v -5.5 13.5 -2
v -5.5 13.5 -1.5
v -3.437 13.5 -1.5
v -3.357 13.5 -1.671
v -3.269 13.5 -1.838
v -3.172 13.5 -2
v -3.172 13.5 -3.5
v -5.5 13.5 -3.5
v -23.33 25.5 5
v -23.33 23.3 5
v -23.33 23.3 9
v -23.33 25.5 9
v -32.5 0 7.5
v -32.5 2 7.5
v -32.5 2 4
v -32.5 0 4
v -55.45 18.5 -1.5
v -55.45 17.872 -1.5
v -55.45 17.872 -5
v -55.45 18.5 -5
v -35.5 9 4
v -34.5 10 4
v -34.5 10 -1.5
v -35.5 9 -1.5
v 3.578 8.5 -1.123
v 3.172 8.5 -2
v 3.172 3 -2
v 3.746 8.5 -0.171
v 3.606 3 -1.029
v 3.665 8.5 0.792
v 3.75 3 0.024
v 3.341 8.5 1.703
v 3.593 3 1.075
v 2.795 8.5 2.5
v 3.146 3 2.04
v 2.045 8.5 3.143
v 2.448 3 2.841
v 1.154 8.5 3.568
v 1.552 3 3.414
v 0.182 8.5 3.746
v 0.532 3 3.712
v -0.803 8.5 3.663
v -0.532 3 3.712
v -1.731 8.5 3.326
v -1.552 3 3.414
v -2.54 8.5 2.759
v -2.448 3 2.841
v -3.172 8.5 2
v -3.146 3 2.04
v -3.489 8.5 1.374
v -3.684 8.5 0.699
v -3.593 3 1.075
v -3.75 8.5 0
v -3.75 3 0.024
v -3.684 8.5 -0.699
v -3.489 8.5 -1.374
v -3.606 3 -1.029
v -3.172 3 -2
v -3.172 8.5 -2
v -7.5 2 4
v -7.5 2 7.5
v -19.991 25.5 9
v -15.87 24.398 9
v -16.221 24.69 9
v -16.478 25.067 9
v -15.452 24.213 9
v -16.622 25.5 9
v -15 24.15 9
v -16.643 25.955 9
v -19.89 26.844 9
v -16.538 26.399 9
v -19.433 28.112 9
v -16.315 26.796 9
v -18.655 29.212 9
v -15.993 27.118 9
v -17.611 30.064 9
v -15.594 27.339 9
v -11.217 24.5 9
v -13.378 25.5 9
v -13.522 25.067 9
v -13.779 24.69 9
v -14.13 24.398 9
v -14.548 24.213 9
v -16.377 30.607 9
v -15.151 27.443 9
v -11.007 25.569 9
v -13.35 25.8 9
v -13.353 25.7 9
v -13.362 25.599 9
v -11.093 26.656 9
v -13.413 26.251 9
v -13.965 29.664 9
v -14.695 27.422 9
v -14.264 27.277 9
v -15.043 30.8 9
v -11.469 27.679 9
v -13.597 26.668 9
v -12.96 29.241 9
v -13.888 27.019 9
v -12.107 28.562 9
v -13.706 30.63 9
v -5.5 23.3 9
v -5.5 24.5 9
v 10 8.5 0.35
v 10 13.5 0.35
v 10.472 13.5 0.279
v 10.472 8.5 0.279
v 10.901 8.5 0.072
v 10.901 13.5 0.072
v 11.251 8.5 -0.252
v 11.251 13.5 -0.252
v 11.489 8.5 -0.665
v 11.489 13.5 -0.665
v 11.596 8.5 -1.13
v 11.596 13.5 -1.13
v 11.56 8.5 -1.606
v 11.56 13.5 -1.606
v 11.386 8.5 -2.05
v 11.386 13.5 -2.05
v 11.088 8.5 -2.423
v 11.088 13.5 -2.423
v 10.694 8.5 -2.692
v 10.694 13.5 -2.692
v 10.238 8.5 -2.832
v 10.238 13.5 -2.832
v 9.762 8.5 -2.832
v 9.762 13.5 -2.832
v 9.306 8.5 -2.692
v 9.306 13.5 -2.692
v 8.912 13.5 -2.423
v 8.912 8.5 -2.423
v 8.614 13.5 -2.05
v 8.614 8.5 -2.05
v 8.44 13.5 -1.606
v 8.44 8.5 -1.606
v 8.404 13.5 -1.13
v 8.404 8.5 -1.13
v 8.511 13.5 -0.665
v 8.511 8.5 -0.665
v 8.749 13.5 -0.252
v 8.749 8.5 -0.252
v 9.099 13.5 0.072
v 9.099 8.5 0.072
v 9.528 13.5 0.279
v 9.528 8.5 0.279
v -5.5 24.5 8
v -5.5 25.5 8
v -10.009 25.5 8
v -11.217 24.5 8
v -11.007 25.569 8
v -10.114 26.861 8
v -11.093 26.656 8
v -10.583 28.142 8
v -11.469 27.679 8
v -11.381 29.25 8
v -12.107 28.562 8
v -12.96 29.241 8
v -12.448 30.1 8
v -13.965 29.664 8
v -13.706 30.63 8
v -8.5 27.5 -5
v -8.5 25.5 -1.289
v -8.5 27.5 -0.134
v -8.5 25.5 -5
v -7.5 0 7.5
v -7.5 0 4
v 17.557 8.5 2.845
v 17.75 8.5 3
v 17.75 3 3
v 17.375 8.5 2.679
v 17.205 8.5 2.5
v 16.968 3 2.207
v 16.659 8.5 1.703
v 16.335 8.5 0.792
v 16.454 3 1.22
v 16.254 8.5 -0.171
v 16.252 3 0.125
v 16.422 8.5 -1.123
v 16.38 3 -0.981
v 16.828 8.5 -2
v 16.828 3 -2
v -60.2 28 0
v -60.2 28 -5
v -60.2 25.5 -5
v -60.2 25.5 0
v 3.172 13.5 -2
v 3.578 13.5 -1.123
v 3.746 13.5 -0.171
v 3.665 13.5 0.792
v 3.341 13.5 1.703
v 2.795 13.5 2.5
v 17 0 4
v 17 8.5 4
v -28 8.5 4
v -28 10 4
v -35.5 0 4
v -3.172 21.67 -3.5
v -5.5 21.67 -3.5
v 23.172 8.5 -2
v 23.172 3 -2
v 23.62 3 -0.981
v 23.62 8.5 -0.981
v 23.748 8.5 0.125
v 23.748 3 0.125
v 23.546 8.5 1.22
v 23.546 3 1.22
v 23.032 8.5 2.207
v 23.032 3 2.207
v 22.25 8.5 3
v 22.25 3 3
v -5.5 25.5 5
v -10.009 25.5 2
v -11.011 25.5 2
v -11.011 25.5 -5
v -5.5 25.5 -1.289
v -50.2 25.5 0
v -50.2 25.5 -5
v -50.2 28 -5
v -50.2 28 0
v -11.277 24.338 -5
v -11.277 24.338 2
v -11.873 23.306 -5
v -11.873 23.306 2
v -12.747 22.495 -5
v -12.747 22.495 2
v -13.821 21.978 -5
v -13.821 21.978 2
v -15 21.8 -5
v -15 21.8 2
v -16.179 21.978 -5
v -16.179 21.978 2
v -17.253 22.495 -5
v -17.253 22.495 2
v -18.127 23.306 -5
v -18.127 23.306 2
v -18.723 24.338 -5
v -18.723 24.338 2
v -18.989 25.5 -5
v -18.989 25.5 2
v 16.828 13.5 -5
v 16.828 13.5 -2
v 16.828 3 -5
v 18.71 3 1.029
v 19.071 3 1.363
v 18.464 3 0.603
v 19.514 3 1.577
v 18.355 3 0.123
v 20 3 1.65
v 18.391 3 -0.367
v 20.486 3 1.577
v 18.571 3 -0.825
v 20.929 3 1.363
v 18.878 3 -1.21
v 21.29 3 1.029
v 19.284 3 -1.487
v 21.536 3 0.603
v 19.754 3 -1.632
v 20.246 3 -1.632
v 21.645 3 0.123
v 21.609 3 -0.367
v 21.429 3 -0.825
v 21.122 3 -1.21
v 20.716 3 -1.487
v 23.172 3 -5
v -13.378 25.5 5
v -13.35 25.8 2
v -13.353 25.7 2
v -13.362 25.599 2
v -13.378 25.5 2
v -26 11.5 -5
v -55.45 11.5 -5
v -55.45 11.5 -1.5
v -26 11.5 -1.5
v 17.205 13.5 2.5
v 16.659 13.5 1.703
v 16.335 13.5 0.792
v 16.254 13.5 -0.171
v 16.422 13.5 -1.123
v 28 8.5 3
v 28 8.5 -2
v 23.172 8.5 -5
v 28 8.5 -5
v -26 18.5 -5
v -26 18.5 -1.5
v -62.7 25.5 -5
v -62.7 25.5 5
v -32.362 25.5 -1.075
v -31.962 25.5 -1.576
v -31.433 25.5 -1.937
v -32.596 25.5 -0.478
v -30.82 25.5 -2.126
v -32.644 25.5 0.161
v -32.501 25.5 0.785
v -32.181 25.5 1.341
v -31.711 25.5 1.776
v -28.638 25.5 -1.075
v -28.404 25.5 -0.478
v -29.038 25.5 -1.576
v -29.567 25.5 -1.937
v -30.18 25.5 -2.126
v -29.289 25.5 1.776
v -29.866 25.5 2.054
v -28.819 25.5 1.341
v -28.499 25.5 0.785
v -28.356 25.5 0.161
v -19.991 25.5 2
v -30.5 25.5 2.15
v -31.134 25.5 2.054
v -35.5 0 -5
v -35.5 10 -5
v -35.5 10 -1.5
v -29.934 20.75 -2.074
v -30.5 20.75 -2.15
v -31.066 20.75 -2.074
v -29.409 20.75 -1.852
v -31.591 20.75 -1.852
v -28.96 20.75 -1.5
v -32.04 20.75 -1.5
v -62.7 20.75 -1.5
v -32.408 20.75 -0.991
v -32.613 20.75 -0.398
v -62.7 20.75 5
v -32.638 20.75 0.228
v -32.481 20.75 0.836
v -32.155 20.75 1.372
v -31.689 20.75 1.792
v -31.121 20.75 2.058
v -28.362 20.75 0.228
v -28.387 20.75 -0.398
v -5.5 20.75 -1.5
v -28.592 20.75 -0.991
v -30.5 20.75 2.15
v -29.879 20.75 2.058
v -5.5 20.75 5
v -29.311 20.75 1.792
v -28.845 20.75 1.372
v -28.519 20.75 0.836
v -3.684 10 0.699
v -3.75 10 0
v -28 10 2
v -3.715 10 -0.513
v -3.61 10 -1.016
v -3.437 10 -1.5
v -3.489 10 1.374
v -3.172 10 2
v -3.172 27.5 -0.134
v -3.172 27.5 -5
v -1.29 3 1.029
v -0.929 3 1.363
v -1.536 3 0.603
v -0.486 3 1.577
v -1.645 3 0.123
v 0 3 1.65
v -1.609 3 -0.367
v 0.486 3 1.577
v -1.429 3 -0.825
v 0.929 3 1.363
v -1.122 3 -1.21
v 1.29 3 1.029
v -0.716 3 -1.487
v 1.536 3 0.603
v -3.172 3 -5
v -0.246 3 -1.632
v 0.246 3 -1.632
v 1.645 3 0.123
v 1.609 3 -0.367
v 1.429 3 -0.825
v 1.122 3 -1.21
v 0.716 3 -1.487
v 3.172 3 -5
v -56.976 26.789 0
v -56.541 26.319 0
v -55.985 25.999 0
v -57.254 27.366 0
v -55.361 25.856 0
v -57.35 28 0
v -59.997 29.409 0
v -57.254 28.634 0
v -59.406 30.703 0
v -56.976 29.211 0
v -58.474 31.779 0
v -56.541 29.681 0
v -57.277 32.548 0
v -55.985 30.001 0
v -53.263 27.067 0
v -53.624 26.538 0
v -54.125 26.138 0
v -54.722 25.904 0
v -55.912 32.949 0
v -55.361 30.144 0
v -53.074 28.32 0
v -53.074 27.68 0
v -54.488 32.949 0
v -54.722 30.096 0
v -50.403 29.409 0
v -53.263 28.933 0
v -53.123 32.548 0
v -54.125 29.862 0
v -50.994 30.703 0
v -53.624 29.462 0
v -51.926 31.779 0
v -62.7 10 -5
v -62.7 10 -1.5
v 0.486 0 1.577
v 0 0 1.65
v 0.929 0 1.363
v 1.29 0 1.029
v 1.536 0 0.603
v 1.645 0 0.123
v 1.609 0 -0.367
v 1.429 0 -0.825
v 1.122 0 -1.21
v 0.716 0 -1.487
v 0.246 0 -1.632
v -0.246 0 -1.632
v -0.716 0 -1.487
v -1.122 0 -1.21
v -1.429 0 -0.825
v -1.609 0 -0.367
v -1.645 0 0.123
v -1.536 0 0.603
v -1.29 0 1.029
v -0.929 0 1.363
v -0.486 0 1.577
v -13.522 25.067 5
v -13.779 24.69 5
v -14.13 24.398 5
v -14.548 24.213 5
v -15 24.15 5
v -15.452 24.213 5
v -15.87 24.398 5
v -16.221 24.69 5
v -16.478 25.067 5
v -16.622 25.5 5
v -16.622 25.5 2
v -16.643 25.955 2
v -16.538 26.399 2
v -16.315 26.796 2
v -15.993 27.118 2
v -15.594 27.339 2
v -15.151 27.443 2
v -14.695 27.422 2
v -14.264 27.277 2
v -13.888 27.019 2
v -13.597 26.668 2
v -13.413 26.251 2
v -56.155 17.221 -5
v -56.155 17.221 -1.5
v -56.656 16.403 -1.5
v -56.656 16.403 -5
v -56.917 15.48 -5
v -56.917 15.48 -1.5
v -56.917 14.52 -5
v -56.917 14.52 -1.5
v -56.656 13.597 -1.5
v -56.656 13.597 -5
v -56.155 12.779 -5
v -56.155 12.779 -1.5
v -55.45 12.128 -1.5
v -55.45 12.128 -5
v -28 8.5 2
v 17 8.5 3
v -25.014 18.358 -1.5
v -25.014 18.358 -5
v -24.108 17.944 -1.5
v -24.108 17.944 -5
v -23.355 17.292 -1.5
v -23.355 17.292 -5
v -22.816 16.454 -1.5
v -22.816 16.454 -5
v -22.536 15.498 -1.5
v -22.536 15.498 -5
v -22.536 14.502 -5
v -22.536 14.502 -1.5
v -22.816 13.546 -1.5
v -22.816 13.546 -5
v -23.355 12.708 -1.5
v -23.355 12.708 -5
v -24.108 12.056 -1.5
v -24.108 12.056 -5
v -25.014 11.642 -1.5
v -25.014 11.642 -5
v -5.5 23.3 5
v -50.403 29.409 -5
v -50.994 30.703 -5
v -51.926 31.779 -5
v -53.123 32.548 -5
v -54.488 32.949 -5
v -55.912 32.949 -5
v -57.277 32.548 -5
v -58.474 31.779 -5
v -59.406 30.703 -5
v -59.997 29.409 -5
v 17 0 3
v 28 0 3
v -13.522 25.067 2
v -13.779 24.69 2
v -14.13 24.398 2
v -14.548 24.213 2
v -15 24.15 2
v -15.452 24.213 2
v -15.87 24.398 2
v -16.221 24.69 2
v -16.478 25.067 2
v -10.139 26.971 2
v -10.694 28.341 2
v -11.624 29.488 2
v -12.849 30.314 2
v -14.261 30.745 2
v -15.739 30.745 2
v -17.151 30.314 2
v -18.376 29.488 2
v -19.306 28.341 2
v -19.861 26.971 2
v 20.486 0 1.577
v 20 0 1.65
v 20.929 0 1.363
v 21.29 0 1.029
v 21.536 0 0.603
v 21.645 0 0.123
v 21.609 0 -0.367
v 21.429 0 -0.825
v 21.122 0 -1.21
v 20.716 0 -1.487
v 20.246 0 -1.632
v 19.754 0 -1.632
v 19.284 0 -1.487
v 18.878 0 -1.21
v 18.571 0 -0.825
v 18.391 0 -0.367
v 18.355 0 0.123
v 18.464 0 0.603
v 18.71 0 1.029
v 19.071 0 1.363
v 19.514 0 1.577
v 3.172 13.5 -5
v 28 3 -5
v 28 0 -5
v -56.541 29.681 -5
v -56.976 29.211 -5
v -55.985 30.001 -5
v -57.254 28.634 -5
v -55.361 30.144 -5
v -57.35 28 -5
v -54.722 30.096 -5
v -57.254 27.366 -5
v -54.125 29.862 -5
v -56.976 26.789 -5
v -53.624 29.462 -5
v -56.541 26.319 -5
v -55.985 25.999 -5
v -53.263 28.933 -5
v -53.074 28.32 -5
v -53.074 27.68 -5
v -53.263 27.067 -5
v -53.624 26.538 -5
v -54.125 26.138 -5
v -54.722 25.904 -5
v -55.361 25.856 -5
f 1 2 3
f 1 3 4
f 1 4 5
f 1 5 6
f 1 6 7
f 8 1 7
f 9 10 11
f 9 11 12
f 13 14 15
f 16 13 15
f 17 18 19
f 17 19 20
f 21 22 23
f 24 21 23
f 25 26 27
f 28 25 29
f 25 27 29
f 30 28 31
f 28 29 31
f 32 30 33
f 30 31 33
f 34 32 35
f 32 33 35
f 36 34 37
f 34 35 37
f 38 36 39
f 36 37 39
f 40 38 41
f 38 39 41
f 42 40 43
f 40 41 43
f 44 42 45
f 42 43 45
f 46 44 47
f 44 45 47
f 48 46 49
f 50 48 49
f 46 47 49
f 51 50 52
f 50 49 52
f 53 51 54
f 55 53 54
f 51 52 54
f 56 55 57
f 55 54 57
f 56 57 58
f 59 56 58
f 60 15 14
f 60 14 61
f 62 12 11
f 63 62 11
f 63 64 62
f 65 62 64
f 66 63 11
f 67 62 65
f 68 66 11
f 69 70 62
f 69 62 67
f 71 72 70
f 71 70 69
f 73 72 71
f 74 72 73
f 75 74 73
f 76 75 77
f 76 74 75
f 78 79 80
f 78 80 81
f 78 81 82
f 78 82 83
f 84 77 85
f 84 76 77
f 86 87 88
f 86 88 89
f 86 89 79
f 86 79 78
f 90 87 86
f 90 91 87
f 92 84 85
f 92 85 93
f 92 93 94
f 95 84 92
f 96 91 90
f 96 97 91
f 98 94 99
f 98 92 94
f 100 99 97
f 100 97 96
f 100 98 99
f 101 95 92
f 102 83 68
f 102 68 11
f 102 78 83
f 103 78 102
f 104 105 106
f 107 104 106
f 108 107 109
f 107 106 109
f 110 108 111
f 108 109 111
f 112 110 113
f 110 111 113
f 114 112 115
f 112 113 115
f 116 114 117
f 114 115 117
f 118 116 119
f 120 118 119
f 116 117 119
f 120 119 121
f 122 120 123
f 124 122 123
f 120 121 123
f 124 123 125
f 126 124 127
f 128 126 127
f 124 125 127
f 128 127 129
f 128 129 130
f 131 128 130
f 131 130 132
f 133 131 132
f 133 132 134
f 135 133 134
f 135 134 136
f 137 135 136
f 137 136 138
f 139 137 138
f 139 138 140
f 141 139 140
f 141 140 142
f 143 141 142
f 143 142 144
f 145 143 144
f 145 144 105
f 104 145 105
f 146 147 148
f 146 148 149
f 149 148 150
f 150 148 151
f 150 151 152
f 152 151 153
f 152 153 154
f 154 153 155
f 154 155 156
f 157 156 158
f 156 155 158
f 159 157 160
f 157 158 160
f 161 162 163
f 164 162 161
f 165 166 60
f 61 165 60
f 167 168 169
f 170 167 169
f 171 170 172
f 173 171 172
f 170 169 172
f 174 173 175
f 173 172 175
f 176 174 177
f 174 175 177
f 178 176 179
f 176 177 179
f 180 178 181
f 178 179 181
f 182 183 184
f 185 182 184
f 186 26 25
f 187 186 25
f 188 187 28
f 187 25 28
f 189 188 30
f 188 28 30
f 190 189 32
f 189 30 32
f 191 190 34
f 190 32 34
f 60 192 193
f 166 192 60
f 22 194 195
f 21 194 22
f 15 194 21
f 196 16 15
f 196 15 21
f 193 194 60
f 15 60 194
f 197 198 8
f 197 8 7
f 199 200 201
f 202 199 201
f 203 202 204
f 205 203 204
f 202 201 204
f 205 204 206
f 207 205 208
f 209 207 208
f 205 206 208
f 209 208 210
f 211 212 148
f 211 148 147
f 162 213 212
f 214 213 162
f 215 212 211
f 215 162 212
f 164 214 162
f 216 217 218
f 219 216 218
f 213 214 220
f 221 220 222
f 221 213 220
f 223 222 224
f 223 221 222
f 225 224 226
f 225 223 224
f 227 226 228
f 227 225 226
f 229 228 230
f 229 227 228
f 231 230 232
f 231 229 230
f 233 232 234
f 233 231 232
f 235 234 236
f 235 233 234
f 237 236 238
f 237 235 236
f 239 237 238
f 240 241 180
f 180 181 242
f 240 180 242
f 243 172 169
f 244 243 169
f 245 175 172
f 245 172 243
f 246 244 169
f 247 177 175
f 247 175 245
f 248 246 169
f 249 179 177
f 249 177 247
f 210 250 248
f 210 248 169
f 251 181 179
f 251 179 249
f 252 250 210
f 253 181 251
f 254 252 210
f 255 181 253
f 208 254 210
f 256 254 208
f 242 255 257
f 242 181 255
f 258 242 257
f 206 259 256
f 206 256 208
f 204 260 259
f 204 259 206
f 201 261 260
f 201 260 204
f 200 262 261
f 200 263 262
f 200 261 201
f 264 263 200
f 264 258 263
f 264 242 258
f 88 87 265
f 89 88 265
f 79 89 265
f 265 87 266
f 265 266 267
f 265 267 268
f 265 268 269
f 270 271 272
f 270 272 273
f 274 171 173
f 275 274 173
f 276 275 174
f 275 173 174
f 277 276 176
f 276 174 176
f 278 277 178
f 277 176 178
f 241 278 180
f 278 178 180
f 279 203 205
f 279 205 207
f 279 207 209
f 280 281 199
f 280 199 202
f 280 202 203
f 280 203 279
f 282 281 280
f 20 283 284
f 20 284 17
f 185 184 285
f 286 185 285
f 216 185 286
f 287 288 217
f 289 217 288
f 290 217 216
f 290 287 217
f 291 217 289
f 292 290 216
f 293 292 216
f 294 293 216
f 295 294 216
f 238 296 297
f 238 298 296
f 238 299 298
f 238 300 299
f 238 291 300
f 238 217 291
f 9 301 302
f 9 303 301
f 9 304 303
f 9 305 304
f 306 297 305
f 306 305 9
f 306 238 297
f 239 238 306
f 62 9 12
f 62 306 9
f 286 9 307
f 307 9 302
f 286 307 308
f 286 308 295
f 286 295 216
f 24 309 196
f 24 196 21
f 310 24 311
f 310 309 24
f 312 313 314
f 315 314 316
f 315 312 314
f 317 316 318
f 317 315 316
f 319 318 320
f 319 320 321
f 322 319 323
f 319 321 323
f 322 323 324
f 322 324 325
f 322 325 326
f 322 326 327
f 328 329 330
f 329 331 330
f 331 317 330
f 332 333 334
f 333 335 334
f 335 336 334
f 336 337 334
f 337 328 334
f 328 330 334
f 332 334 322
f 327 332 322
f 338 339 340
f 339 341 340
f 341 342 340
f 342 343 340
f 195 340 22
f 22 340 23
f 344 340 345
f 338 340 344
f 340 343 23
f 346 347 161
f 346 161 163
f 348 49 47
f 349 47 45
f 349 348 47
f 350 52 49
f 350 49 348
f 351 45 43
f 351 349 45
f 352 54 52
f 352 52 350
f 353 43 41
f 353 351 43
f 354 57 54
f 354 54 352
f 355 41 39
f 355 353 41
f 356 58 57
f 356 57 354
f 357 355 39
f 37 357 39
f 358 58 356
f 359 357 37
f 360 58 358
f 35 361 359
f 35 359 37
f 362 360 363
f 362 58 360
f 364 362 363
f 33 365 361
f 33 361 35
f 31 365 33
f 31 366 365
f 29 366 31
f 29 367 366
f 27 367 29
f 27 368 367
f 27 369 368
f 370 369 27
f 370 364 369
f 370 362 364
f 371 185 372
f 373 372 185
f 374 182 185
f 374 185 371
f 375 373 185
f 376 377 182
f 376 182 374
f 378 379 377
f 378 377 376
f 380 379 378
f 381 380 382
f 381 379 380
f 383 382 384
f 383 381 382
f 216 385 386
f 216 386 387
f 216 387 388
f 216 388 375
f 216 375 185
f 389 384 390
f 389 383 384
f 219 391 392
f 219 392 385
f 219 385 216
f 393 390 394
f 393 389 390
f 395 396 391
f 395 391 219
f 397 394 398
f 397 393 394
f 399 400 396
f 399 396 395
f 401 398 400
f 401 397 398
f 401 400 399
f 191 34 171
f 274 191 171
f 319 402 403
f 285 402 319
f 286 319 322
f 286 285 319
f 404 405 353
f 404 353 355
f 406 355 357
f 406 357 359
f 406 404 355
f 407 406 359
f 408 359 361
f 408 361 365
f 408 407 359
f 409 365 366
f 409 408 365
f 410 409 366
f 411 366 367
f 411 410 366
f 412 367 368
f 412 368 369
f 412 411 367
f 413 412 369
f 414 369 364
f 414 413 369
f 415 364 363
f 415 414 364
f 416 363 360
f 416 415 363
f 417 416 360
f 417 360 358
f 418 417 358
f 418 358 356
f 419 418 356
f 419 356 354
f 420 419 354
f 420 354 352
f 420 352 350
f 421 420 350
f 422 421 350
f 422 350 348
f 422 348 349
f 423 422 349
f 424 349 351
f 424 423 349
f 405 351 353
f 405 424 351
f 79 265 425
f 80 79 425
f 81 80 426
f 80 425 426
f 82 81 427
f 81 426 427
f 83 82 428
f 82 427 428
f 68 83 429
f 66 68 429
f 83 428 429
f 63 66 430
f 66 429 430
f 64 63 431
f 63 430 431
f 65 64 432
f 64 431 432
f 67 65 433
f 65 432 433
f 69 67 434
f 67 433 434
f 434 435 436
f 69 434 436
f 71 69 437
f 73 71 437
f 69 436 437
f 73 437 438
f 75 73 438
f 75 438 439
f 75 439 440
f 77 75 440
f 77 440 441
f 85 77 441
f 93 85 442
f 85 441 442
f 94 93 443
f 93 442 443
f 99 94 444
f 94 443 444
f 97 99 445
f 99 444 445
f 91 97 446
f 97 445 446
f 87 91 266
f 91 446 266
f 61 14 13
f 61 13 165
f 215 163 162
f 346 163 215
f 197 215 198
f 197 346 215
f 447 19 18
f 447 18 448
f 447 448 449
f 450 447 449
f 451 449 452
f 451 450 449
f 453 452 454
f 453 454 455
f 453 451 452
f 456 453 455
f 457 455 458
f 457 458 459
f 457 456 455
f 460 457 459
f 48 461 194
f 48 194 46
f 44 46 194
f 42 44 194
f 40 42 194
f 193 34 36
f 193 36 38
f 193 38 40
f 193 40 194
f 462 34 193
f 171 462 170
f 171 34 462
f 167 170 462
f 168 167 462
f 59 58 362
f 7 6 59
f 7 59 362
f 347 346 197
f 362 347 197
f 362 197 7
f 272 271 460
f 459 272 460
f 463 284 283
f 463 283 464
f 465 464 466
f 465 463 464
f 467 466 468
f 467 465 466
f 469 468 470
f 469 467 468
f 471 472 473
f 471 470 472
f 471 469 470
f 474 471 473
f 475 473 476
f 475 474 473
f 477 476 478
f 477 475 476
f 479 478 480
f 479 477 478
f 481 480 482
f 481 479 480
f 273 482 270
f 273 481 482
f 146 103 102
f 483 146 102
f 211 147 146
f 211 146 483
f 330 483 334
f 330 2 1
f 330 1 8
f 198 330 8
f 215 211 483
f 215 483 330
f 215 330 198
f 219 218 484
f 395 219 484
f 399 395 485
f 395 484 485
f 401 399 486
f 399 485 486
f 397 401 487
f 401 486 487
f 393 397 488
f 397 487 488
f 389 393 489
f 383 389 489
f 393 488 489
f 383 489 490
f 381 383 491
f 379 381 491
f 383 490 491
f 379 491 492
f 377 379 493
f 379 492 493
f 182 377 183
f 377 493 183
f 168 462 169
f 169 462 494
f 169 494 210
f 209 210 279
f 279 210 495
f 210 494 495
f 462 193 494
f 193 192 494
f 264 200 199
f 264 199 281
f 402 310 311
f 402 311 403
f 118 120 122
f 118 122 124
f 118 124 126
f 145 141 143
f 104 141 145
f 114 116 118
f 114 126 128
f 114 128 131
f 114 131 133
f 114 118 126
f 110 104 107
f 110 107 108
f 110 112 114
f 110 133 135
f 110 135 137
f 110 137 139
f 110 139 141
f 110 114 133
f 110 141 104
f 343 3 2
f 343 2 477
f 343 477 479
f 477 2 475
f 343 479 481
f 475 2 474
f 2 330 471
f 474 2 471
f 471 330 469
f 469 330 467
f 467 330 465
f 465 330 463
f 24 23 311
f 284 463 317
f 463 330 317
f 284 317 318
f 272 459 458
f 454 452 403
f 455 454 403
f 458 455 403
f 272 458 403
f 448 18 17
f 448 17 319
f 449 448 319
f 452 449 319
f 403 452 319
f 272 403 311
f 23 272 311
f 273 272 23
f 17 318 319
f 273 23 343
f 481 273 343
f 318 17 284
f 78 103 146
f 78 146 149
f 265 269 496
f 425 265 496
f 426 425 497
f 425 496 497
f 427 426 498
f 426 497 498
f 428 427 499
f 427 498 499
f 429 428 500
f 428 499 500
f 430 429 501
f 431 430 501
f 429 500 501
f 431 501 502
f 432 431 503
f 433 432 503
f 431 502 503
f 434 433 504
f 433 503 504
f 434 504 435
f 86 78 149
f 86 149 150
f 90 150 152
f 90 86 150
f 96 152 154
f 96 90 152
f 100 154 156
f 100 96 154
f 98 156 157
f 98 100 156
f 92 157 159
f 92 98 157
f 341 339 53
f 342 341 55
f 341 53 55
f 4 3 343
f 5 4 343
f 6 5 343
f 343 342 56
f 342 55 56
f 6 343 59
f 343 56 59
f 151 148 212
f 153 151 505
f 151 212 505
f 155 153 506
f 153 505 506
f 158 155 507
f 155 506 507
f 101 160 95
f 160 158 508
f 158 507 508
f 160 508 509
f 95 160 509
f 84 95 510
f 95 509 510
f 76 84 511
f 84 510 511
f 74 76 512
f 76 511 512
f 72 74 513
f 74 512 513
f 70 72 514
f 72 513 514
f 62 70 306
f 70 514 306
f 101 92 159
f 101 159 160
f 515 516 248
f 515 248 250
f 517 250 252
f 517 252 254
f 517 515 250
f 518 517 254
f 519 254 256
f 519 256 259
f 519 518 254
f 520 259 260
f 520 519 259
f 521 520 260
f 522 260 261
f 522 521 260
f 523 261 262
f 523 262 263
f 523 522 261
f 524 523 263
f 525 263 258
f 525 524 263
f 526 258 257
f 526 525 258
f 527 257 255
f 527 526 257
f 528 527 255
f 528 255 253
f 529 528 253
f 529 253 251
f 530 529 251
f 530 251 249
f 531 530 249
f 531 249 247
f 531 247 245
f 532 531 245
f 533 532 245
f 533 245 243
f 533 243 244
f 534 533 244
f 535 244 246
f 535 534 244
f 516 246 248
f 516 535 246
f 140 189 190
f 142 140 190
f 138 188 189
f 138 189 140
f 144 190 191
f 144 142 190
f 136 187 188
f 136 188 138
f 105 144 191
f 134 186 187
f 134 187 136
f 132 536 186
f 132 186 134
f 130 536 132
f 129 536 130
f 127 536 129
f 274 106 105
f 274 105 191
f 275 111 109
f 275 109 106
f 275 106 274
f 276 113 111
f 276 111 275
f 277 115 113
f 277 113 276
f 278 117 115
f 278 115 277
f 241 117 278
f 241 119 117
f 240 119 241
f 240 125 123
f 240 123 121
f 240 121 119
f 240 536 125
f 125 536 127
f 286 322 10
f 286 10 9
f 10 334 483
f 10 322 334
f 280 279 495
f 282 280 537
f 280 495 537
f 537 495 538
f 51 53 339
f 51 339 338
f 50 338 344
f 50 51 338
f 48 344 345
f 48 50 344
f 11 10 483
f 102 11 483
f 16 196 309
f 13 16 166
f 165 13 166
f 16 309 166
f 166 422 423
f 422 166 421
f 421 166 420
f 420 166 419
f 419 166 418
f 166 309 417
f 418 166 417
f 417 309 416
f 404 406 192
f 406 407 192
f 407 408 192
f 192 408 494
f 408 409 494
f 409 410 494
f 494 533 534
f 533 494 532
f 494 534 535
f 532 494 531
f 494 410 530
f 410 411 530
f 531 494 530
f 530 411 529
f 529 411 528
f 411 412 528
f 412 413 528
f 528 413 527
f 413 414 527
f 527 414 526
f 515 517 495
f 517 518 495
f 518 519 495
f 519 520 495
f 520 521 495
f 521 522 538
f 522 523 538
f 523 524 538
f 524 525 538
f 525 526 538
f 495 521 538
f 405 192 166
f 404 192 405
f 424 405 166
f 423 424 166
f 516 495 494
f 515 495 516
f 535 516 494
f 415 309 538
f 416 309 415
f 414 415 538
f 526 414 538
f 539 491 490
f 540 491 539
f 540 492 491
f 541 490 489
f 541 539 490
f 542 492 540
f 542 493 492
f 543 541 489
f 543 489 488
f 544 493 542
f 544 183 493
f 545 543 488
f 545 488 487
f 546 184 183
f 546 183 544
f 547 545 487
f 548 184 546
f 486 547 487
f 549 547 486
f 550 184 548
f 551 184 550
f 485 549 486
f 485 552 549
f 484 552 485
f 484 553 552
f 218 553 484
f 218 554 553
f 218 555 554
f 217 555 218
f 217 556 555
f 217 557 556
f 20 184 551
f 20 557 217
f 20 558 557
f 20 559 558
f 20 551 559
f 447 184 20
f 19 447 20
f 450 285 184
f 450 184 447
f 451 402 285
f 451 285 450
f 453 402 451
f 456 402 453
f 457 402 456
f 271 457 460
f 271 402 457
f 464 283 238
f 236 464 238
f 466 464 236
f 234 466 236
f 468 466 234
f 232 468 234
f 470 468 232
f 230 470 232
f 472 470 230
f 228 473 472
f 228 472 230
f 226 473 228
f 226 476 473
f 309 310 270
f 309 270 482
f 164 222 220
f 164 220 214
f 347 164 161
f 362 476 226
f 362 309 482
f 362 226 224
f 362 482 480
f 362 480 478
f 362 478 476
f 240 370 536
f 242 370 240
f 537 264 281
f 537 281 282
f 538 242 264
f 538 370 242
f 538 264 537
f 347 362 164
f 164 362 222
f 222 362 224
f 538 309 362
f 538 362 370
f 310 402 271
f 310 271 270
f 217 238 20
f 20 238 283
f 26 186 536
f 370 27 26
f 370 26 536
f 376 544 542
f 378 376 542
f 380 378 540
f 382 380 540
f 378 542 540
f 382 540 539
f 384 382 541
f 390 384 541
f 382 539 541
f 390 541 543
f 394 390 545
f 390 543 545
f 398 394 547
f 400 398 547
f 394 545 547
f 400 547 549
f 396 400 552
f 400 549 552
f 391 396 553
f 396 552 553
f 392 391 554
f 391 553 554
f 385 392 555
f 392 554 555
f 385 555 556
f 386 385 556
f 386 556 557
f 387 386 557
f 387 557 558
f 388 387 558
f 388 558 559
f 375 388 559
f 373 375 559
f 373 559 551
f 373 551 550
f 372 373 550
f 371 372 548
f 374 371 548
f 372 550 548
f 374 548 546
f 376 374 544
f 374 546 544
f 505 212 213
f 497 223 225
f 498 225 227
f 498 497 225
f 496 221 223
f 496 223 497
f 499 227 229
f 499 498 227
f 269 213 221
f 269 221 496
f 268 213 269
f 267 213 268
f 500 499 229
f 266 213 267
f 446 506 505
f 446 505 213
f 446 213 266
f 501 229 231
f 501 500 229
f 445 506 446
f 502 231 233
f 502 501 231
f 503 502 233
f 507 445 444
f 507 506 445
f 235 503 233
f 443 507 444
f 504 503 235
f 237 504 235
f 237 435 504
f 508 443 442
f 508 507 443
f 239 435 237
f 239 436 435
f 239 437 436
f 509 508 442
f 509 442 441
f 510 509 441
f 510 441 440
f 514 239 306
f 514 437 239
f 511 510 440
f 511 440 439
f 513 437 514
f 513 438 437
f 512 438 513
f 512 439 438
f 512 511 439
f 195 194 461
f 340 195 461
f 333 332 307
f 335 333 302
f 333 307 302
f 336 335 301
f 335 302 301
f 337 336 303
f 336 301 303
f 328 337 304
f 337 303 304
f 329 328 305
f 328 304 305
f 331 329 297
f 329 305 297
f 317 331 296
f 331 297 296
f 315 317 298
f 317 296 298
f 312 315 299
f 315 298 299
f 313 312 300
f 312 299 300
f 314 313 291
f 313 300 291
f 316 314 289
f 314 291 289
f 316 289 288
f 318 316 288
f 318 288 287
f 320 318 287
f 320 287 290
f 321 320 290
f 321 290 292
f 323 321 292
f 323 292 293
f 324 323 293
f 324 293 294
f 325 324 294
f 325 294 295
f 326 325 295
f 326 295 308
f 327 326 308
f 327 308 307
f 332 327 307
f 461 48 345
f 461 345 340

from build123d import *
from build123d.topology import SkipClean

# Parameters (mm, degrees)
SKETCH_1_W                   = 63.5
SKETCH_1_H                   = 8
SKETCH_1_R                   = 1.65
EXTRUDE_1_DEPTH              = 3
SKETCH_4_W                   = 52.5
SKETCH_4_H                   = 1
EXTRUDE_3_DEPTH              = 3
EXTRUDE_4_DEPTH              = 5.5
EXTRUDE_5_DEPTH              = 1.5
EXTRUDE_5_DIRECTION_2_REACH  = 38.844
CHAMFER_1_SIZE               = 1
SKETCH_8_W                   = 22
SKETCH_8_H                   = 3.5
EXTRUDE_6_DEPTH              = 12.5
EXTRUDE_7_DEPTH              = 5
SKETCH_11_W                  = 10
SKETCH_11_H                  = 2
CUT_EXTRUDE_1_DEPTH          = 5
CUT_EXTRUDE_3_DEPTH          = 43.388087949
EXTRUDE_8_DEPTH              = 3.5
SKETCH_16_W                  = 3.5
SKETCH_16_H                  = 4
EXTRUDE_9_DEPTH              = 8
SKETCH_2_W                   = 10
SKETCH_2_H                   = 2
EXTRUDE_2_DEPTH              = 3
SKETCH_17_W                  = 30
SKETCH_17_H                  = 4.75
EXTRUDE_10_DEPTH             = 10
EXTRUDE_11_DEPTH             = 17
EXTRUDE_12_REACH             = 44.326
SKETCH_19_W                  = 2.327855615
SKETCH_19_H                  = 3
SKETCH_19_W_2                = 13.65571123
SKETCH_19_W_3                = 4.827855615
SKETCH_21_R                  = 1.65
CUT_EXTRUDE_4_DEPTH          = 45.838599443
EXTRUDE_13_DEPTH             = 4
EXTRUDE_13_DEPTH_BACK        = 3
SKETCH_23_R                  = 4
CUT_EXTRUDE_5_DEPTH          = 48.517260022
SKETCH_24_W                  = 5.169872981
SKETCH_24_H                  = 2.2
SKETCH_24_W_2                = 4
EXTRUDE_14_DEPTH             = 4
CUT_EXTRUDE_6_DEPTH          = 1
SKETCH_26_R                  = 2.15
CUT_EXTRUDE_7_DEPTH          = 4.75
EXTRUDE_15_DEPTH             = 3.5
SKETCH_28_W                  = 6.5
SKETCH_28_H                  = 4.75
EXTRUDE_16_DEPTH             = 27.2
SKETCH_29_R                  = 2.15
EXTRUDE_17_DEPTH             = 5
SKETCH_30_R                  = 1.6
CUT_EXTRUDE_8_DEPTH          = 5
SKETCH_31_W                  = 28
SKETCH_31_H                  = 2
EXTRUDE_18_DEPTH             = 3.5
CUT_EXTRUDE_9_DEPTH          = 2.5
EXTRUDE_19_DEPTH             = 1.5
SKETCH_34_W                  = 4
SKETCH_34_H                  = 12
CUT_EXTRUDE_10_DEPTH         = 67.647130471
SKETCH_35_W                  = 4.827855615
SKETCH_35_H                  = 3
CUT_EXTRUDE_11_DEPTH         = 5
SKETCH_36_W                  = 2.327855615
SKETCH_36_H                  = 1.5
EXTRUDE_20_DEPTH             = 14
SKETCH_37_W                  = 3
SKETCH_37_H                  = 1.5
EXTRUDE_21_DEPTH             = 2
SKETCH_38_W                  = 3
SKETCH_38_H                  = 3.5
CUT_EXTRUDE_12_DEPTH         = 10
SKETCH_39_W                  = 2
SKETCH_39_H                  = 7
CUT_EXTRUDE_13_DEPTH         = 3.5
EXTRUDE_22_REACH             = 68.647
EXTRUDE_22_DIRECTION_2_REACH = 68.647


with BuildPart() as part:
    # 草图1 → 凸台-拉伸1 (new body)
    with BuildSketch(Plane(origin=(0, 0, 0), x_dir=(1, 0, 0), z_dir=(0, 1, 0))):
        with Locations((-3.75, 1)):
            Rectangle(SKETCH_1_W, SKETCH_1_H)
        with Locations(Location((0, 0, 0), (0, 0, 270))):
            Circle(SKETCH_1_R, mode=Mode.SUBTRACT)
        with Locations(Location((20, 0, 0), (0, 0, 270))):
            Circle(SKETCH_1_R, mode=Mode.SUBTRACT)
    extrude(amount=EXTRUDE_1_DEPTH)

    # 草图4 → 凸台-拉伸3 (add)
    with BuildSketch(Plane(origin=(0, 3, 0), x_dir=(1, 0, 0), z_dir=(0, 1, 0))):
        with Locations((-9.25, -3.5)):
            Rectangle(SKETCH_4_W, SKETCH_4_H)
    extrude(amount=-EXTRUDE_3_DEPTH)

    # 草图6 → 凸台-拉伸4 (add)
    with BuildSketch(Plane(origin=(0, 3, 0), x_dir=(1, 0, 0), z_dir=(0, 1, 0))):
        with BuildLine():
            Line((-35.5, -4), (17, -4))
            Line((17, -4), (17, -3))
            Line((17, -3), (17.75, -3))
            ThreePointArc((17.75, -3), (16.31219409, -0.680137903), (16.827855615, 2))
            Line((16.827855615, 2), (3.172144385, 2))
            ThreePointArc((3.172144385, 2), (0, -3.75), (-3.172144385, 2))
            Line((-3.172144385, 2), (-35.5, 2))
            Line((-35.5, 2), (-35.5, -4))
        make_face()
        with BuildLine():
            Line((28, -3), (28, 2))
            Line((28, 2), (23.172144385, 2))
            ThreePointArc((23.172144385, 2), (23.68780591, -0.680137903), (22.25, -3))
            Line((22.25, -3), (28, -3))
        make_face()
    extrude(amount=EXTRUDE_4_DEPTH)

    # 草图7 → 凸台-拉伸5 (add)
    with BuildSketch(Plane(origin=(0, 8.5, 0), x_dir=(1, 0, 0), z_dir=(0, 1, 0))):
        Polygon((-18, -4), (-35.5, -4), (-35.5, 5), (-5.5, 5), (-5.5, 0), (-18, 0), align=None)
    extrude(amount=EXTRUDE_5_DEPTH)

    # 草图7 → 凸台-拉伸5 direction 2 (add, up to next)
    with BuildSketch(Plane(origin=(0, 8.5, 0), x_dir=(1, 0, 0), z_dir=(0, 1, 0)), mode=Mode.PRIVATE) as extrude_5_direction_2_sk1:
        Polygon((-18, -4), (-35.5, -4), (-35.5, 5), (-5.5, 5), (-5.5, 0), (-18, 0), align=None)
    extrude_5_direction_2_tool1 = extrude(extrude_5_direction_2_sk1.sketch, amount=-EXTRUDE_5_DIRECTION_2_REACH, mode=Mode.PRIVATE) - part.part
    add(extrude_5_direction_2_tool1.solids().sort_by_distance((-22.488636, 8.5, -1.068182))[0])

    # 倒角1
    chamfer_1_edges = [part.edges().sort_by_distance(p)[0] for p in [
        (-35.5, 10, -0.5),
    ]]
    chamfer(chamfer_1_edges, length=CHAMFER_1_SIZE)

    # 草图8 → 凸台-拉伸6 (add)
    with BuildSketch(Plane(origin=(0, 10, 0), x_dir=(1, 0, 0), z_dir=(0, 1, 0))):
        with Locations((-16.5, 3.25)):
            Rectangle(SKETCH_8_W, SKETCH_8_H)
    extrude(amount=EXTRUDE_6_DEPTH)

    # 草图10 → 凸台-拉伸7 (add)
    with BuildSketch(Plane(origin=(0, 8.5, 0), x_dir=(1, 0, 0), z_dir=(0, 1, 0))):
        with BuildLine():
            Line((2.795084972, -2.5), (17.204915028, -2.5))
            ThreePointArc((17.204915028, -2.5), (16.263095325, -0.313118908), (16.827855615, 2))
            Line((16.827855615, 2), (3.172144385, 2))
            ThreePointArc((3.172144385, 2), (3.736904675, -0.313118908), (2.795084972, -2.5))
        make_face()
    extrude(amount=EXTRUDE_7_DEPTH)

    # 草图11 → 切除-拉伸1 (cut)
    with BuildSketch(Plane(origin=(0, 8.5, 0), x_dir=(1, 0, 0), z_dir=(0, 1, 0))):
        with Locations((-23, -3)):
            Rectangle(SKETCH_11_W, SKETCH_11_H)
    extrude(amount=CUT_EXTRUDE_1_DEPTH, mode=Mode.SUBTRACT)

    # 草图14 → 切除-拉伸3 (cut, through all)
    with BuildSketch(Plane.XY.offset(-1.5)):
        with BuildLine():
            Line((-27.5, 18.5), (-26, 18.5))
            ThreePointArc((-26, 18.5), (-22.5, 15), (-26, 11.5))
            Line((-26, 11.5), (-27.5, 11.5))
            ThreePointArc((-27.5, 11.5), (-31, 15), (-27.5, 18.5))
        make_face()
    extrude(amount=-CUT_EXTRUDE_3_DEPTH, mode=Mode.SUBTRACT)

    # 草图15 → 凸台-拉伸8 (add)
    with BuildSketch(Plane.XY.offset(-1.5)):
        Polygon((-27.5, 10), (-34.5, 10), (-35.5, 9), (-35.5, 11.5), (-27.5, 11.5), align=None)
    extrude(amount=-EXTRUDE_8_DEPTH)

    # 草图16 → 凸台-拉伸9 (add)
    with BuildSketch(Plane.ZY.offset(27.5)):
        with Locations((-3.25, 20.5)):
            Rectangle(SKETCH_16_W, SKETCH_16_H)
    extrude(amount=EXTRUDE_9_DEPTH)

    # 草图2 → 凸台-拉伸2 (add)
    with BuildSketch(Plane(origin=(0, 3, 0), x_dir=(1, 0, 0), z_dir=(0, 1, 0))):
        with Locations((10, -2)):
            Rectangle(SKETCH_2_W, SKETCH_2_H)
    extrude(amount=EXTRUDE_2_DEPTH)

    # 草图17 → 凸台-拉伸10 (add)
    with BuildSketch(Plane(origin=(0, 0, -5), x_dir=(-1, 0, 0), z_dir=(0, 0, -1))):
        with Locations((20.5, 23.125)):
            Rectangle(SKETCH_17_W, SKETCH_17_H)
    extrude(amount=-EXTRUDE_10_DEPTH)

    # 草图18 → 凸台-拉伸11 (add)
    with BuildSketch(Plane(origin=(0, 8.5, 0), x_dir=(1, 0, 0), z_dir=(0, 1, 0))):
        with BuildLine():
            Line((-5.5, 2), (-5.5, -2))
            Line((-5.5, -2), (-3.172144385, -2))
            ThreePointArc((-3.172144385, -2), (-3.75, 0), (-3.172144385, 2))
            Line((-3.172144385, 2), (-5.5, 2))
        make_face()
    extrude(amount=EXTRUDE_11_DEPTH)

    # 凸台-拉伸12: up to this face of the body (flat: up to its plane)
    extrude_12_end = Plane(part.part.faces().sort_by_distance((10, 13.5, 0.269728819))[0])
    # 草图19 → 凸台-拉伸12 (add, up to the picked face)
    with BuildSketch(Plane(origin=(0, 3, 0), x_dir=(1, 0, 0), z_dir=(0, 1, 0)), mode=Mode.PRIVATE) as extrude_12_sk1:
        with Locations((-4.336072192, 3.5)):
            Rectangle(SKETCH_19_W, SKETCH_19_H)
    extrude_12_tool1 = split(extrude(extrude_12_sk1.sketch, amount=EXTRUDE_12_REACH, mode=Mode.PRIVATE), bisect_by=extrude_12_end, keep=Keep.BOTH, mode=Mode.PRIVATE)
    # 草图19 → 凸台-拉伸12 (add, up to the picked face)
    with BuildSketch(Plane(origin=(0, 3, 0), x_dir=(1, 0, 0), z_dir=(0, 1, 0)), mode=Mode.PRIVATE) as extrude_12_sk2:
        with Locations((10, 3.5)):
            Rectangle(SKETCH_19_W_2, SKETCH_19_H)
    extrude_12_tool2 = split(extrude(extrude_12_sk2.sketch, amount=EXTRUDE_12_REACH, mode=Mode.PRIVATE), bisect_by=extrude_12_end, keep=Keep.BOTH, mode=Mode.PRIVATE)
    # 草图19 → 凸台-拉伸12 (add, up to the picked face)
    with BuildSketch(Plane(origin=(0, 3, 0), x_dir=(1, 0, 0), z_dir=(0, 1, 0)), mode=Mode.PRIVATE) as extrude_12_sk3:
        with Locations((25.586072193, 3.5)):
            Rectangle(SKETCH_19_W_3, SKETCH_19_H)
    extrude_12_tool3 = split(extrude(extrude_12_sk3.sketch, amount=EXTRUDE_12_REACH, mode=Mode.PRIVATE), bisect_by=extrude_12_end, keep=Keep.BOTH, mode=Mode.PRIVATE)
    add(extrude_12_tool1.solids().sort_by(Axis((-4.336072, 3, -3.5), (0, 1, 0)))[0])
    add(extrude_12_tool2.solids().sort_by(Axis((10, 3, -3.5), (0, 1, 0)))[0])
    add(extrude_12_tool3.solids().sort_by(Axis((25.586072, 3, -3.5), (0, 1, 0)))[0])

    # 草图21 → 切除-拉伸4 (cut, through all)
    with BuildSketch(Plane(origin=(0, 0, -5), x_dir=(-1, 0, 0), z_dir=(0, 0, -1))):
        with Locations((15, 25.8)):
            Circle(SKETCH_21_R)
    extrude(amount=-CUT_EXTRUDE_4_DEPTH, mode=Mode.SUBTRACT)

    # 草图22 → 凸台-拉伸13 (add, two sides: drawn at the far end of the back side and taken through both)
    with BuildSketch(Plane.XY.offset(5).offset(-EXTRUDE_13_DEPTH_BACK)):
        with BuildLine():
            ThreePointArc((-19.990991885, 25.5), (-19.788612994, 24.361533597), (-19.330127019, 23.3))
            Line((-19.330127019, 23.3), (-10.669872981, 23.3))
            ThreePointArc((-10.669872981, 23.3), (-10.211387006, 24.361533597), (-10.009008115, 25.5))
            Line((-10.009008115, 25.5), (-13.377501926, 25.5))
            ThreePointArc((-13.377501926, 25.5), (-15, 24.15), (-16.622498074, 25.5))
            Line((-16.622498074, 25.5), (-19.990991885, 25.5))
        make_face()
        with BuildLine():
            ThreePointArc((-10.009008115, 25.5), (-15, 30.8), (-19.990991885, 25.5))
            Line((-19.990991885, 25.5), (-16.622498074, 25.5))
            ThreePointArc((-16.622498074, 25.5), (-15.150628978, 27.443110134), (-13.35, 25.8))
            ThreePointArc((-13.35, 25.8), (-13.356889866, 25.649371022), (-13.377501926, 25.5))
            Line((-13.377501926, 25.5), (-10.009008115, 25.5))
        make_face()
    extrude(amount=EXTRUDE_13_DEPTH + EXTRUDE_13_DEPTH_BACK)

    # 草图23 → 切除-拉伸5 (cut, through all)
    with BuildSketch(Plane(origin=(0, 0, 2), x_dir=(-1, 0, 0), z_dir=(0, 0, -1))):
        with Locations((15, 25.8)):
            Circle(SKETCH_23_R)
    extrude(amount=CUT_EXTRUDE_5_DEPTH, mode=Mode.SUBTRACT)

    # 草图24 → 凸台-拉伸14 (add)
    with BuildSketch(Plane.XY.offset(5)):
        with Locations((-8.084936491, 24.4)):
            Rectangle(SKETCH_24_W, SKETCH_24_H)
        with Locations((-21.330127019, 24.4)):
            Rectangle(SKETCH_24_W_2, SKETCH_24_H)
    extrude(amount=EXTRUDE_14_DEPTH)

    # 草图25 → 切除-拉伸6 (cut)
    with BuildSketch(Plane.XY.offset(9)):
        with BuildLine():
            Line((-13.96472382, 29.663703305), (-13.705904774, 30.629629131))
            ThreePointArc((-13.705904774, 30.629629131), (-10.943664985, 28.723379251), (-10.009008115, 25.5))
            Line((-10.009008115, 25.5), (-5.5, 25.5))
            Line((-5.5, 25.5), (-5.5, 24.5))
            Line((-5.5, 24.5), (-11.217143936, 24.5))
            ThreePointArc((-11.217143936, 24.5), (-11.468773933, 27.678947169), (-13.96472382, 29.663703305))
        make_face()
    extrude(amount=-CUT_EXTRUDE_6_DEPTH, mode=Mode.SUBTRACT)

    # 草图26 → 切除-拉伸7 (cut)
    with BuildSketch(Plane(origin=(0, 25.5, 0), x_dir=(1, 0, 0), z_dir=(0, 1, 0))):
        with Locations(Location((-30.5, 0, 0), (0, 0, 270))):
            Circle(SKETCH_26_R)
    extrude(amount=-CUT_EXTRUDE_7_DEPTH, mode=Mode.SUBTRACT)

    # 草图27 → 凸台-拉伸15 (add)
    with BuildSketch(Plane(origin=(0, 0, -5), x_dir=(-1, 0, 0), z_dir=(0, 0, -1))):
        with BuildLine():
            Line((35.5, 10), (62.7, 10))
            Line((62.7, 10), (62.7, 25.5))
            Line((62.7, 25.5), (35.5, 25.5))
            Line((35.5, 25.5), (35.5, 18.5))
            Line((35.5, 18.5), (53.45, 18.5))
            ThreePointArc((53.45, 18.5), (56.95, 15), (53.45, 11.5))
            Line((53.45, 11.5), (35.5, 11.5))
            Line((35.5, 11.5), (35.5, 10))
        make_face()
    extrude(amount=-EXTRUDE_15_DEPTH)

    # 草图28 → 凸台-拉伸16 (add)
    with BuildSketch(Plane.ZY.offset(35.5)):
        with Locations((1.75, 23.125)):
            Rectangle(SKETCH_28_W, SKETCH_28_H)
    extrude(amount=EXTRUDE_16_DEPTH)

    # 草图29 → 凸台-拉伸17 (add)
    with BuildSketch(Plane(origin=(0, 0, -5), x_dir=(-1, 0, 0), z_dir=(0, 0, -1))):
        with BuildLine():
            Line((60.2, 28), (60.2, 25.5))
            Line((60.2, 25.5), (50.2, 25.5))
            Line((50.2, 25.5), (50.2, 28))
            ThreePointArc((50.2, 28), (55.2, 33), (60.2, 28))
        make_face()
        with Locations((55.2, 28)):
            Circle(SKETCH_29_R, mode=Mode.SUBTRACT)
    extrude(amount=-EXTRUDE_17_DEPTH)

    # 草图30 → 切除-拉伸8 (cut)
    with BuildSketch(Plane(origin=(0, 13.5, 0), x_dir=(1, 0, 0), z_dir=(0, 1, 0))):
        with Locations(Location((10, 1.25, 0), (0, 0, 270))):
            Circle(SKETCH_30_R)
    extrude(amount=-CUT_EXTRUDE_8_DEPTH, mode=Mode.SUBTRACT)

    # 草图31 → 凸台-拉伸18 (add)
    with BuildSketch(Plane.XY.offset(4)):
        with Locations((-21.5, 1)):
            Rectangle(SKETCH_31_W, SKETCH_31_H)
    extrude(amount=EXTRUDE_18_DEPTH)

    # 草图32 → 切除-拉伸9 (cut)
    with BuildSketch(Plane.ZY.offset(5.5)):
        Polygon((-1.5, 10), (0, 10), (0, 8.5), (2, 8.5), (2, 20.75), (-1.5, 20.75), align=None)
    extrude(amount=-CUT_EXTRUDE_9_DEPTH, mode=Mode.SUBTRACT)

    # 草图33 → 凸台-拉伸19 (add)
    with SkipClean():  # the faces are left unmerged after this step: merging them gives an invalid solid
        with BuildSketch(Plane(origin=(0, 8.5, 0), x_dir=(1, 0, 0), z_dir=(0, 1, 0))):
            with BuildLine():
                Line((-18, 0), (-3.75, 0))
                ThreePointArc((-3.75, 0), (-3.602640798, -1.040903107), (-3.172144385, -2))
                Line((-3.172144385, -2), (-18, -2))
                Line((-18, -2), (-18, 0))
            make_face()
        extrude(amount=EXTRUDE_19_DEPTH)

    # 草图34 → 切除-拉伸10 (cut, through all)
    with BuildSketch(Plane(origin=(-5.5, 0, 0), x_dir=(0, 0, -1), z_dir=(1, 0, 0))):
        with Locations((0, 19.5)):
            Rectangle(SKETCH_34_W, SKETCH_34_H)
    extrude(amount=CUT_EXTRUDE_10_DEPTH, mode=Mode.SUBTRACT)

    # 草图35 → 切除-拉伸11 (cut)
    with BuildSketch(Plane(origin=(0, 13.5, 0), x_dir=(1, 0, 0), z_dir=(0, 1, 0))):
        with Locations((25.586072193, 3.5)):
            Rectangle(SKETCH_35_W, SKETCH_35_H)
    extrude(amount=-CUT_EXTRUDE_11_DEPTH, mode=Mode.SUBTRACT)

    # 草图36 → 凸台-拉伸20 (add)
    with BuildSketch(Plane(origin=(0, 13.5, 0), x_dir=(1, 0, 0), z_dir=(0, 1, 0))):
        with Locations((-4.336072192, 4.25)):
            Rectangle(SKETCH_36_W, SKETCH_36_H)
    extrude(amount=EXTRUDE_20_DEPTH)

    # 草图37 → 凸台-拉伸21 (add)
    with SkipClean():  # the faces are left unmerged after this step: merging them gives an invalid solid
        with BuildSketch(Plane(origin=(0, 25.5, 0), x_dir=(1, 0, 0), z_dir=(0, 1, 0))):
            with Locations((-7, 4.25)):
                Rectangle(SKETCH_37_W, SKETCH_37_H)
        extrude(amount=EXTRUDE_21_DEPTH)

    # 草图38 → 切除-拉伸12 (cut)
    with SkipClean():  # the faces are left unmerged after this step: merging them gives an invalid solid
        with BuildSketch(Plane(origin=(0, 2, 0), x_dir=(1, 0, 0), z_dir=(0, 1, 0))):
            with Locations((-34, -5.75)):
                Rectangle(SKETCH_38_W, SKETCH_38_H)
        extrude(amount=-CUT_EXTRUDE_12_DEPTH, mode=Mode.SUBTRACT)

    # 草图39 → 切除-拉伸13 (cut)
    with BuildSketch(Plane(origin=(0, 0, -5), x_dir=(-1, 0, 0), z_dir=(0, 0, -1))):
        with Locations((54.45, 15)):
            Rectangle(SKETCH_39_W, SKETCH_39_H)
    extrude(amount=-CUT_EXTRUDE_13_DEPTH, mode=Mode.SUBTRACT)

    # 凸台-拉伸22: up to this face of the body (flat: up to its plane)
    extrude_22_end = Plane(part.part.faces().sort_by_distance((-3.172144385, 13.15, -3.8))[0])
    # 草图40 → 凸台-拉伸22 (add, up to the picked face)
    with BuildSketch(Plane(origin=(-5.5, 0, 0), x_dir=(0, 0, -1), z_dir=(1, 0, 0)), mode=Mode.PRIVATE) as extrude_22_sk1:
        Polygon((3.5, 27.5), (0.133974596, 27.5), (3.5, 21.669872981), align=None)
    extrude_22_tool1 = split(extrude(extrude_22_sk1.sketch, amount=EXTRUDE_22_REACH, mode=Mode.PRIVATE), bisect_by=extrude_22_end, keep=Keep.BOTH, mode=Mode.PRIVATE)
    add(extrude_22_tool1.solids().sort_by(Axis((-5.5, 25.556624, -2.377992), (1, 0, 0)))[0])

    # 凸台-拉伸22 direction 2: up to this face of the body (flat: up to its plane)
    extrude_22_direction_2_end = Plane(part.part.faces().sort_by_distance((-8.5, 26.5, -4.25))[0])
    # 草图40 → 凸台-拉伸22 direction 2 (add, up to the picked face)
    with BuildSketch(Plane(origin=(-5.5, 0, 0), x_dir=(0, 0, -1), z_dir=(1, 0, 0)), mode=Mode.PRIVATE) as extrude_22_direction_2_sk1:
        Polygon((3.5, 27.5), (0.133974596, 27.5), (3.5, 21.669872981), align=None)
    extrude_22_direction_2_tool1 = split(extrude(extrude_22_direction_2_sk1.sketch, amount=-EXTRUDE_22_DIRECTION_2_REACH, mode=Mode.PRIVATE), bisect_by=extrude_22_direction_2_end, keep=Keep.BOTH, mode=Mode.PRIVATE)
    add(extrude_22_direction_2_tool1.solids().sort_by(Axis((-5.5, 25.556624, -2.377992), (-1, 0, 0)))[0])


solid = part.part
